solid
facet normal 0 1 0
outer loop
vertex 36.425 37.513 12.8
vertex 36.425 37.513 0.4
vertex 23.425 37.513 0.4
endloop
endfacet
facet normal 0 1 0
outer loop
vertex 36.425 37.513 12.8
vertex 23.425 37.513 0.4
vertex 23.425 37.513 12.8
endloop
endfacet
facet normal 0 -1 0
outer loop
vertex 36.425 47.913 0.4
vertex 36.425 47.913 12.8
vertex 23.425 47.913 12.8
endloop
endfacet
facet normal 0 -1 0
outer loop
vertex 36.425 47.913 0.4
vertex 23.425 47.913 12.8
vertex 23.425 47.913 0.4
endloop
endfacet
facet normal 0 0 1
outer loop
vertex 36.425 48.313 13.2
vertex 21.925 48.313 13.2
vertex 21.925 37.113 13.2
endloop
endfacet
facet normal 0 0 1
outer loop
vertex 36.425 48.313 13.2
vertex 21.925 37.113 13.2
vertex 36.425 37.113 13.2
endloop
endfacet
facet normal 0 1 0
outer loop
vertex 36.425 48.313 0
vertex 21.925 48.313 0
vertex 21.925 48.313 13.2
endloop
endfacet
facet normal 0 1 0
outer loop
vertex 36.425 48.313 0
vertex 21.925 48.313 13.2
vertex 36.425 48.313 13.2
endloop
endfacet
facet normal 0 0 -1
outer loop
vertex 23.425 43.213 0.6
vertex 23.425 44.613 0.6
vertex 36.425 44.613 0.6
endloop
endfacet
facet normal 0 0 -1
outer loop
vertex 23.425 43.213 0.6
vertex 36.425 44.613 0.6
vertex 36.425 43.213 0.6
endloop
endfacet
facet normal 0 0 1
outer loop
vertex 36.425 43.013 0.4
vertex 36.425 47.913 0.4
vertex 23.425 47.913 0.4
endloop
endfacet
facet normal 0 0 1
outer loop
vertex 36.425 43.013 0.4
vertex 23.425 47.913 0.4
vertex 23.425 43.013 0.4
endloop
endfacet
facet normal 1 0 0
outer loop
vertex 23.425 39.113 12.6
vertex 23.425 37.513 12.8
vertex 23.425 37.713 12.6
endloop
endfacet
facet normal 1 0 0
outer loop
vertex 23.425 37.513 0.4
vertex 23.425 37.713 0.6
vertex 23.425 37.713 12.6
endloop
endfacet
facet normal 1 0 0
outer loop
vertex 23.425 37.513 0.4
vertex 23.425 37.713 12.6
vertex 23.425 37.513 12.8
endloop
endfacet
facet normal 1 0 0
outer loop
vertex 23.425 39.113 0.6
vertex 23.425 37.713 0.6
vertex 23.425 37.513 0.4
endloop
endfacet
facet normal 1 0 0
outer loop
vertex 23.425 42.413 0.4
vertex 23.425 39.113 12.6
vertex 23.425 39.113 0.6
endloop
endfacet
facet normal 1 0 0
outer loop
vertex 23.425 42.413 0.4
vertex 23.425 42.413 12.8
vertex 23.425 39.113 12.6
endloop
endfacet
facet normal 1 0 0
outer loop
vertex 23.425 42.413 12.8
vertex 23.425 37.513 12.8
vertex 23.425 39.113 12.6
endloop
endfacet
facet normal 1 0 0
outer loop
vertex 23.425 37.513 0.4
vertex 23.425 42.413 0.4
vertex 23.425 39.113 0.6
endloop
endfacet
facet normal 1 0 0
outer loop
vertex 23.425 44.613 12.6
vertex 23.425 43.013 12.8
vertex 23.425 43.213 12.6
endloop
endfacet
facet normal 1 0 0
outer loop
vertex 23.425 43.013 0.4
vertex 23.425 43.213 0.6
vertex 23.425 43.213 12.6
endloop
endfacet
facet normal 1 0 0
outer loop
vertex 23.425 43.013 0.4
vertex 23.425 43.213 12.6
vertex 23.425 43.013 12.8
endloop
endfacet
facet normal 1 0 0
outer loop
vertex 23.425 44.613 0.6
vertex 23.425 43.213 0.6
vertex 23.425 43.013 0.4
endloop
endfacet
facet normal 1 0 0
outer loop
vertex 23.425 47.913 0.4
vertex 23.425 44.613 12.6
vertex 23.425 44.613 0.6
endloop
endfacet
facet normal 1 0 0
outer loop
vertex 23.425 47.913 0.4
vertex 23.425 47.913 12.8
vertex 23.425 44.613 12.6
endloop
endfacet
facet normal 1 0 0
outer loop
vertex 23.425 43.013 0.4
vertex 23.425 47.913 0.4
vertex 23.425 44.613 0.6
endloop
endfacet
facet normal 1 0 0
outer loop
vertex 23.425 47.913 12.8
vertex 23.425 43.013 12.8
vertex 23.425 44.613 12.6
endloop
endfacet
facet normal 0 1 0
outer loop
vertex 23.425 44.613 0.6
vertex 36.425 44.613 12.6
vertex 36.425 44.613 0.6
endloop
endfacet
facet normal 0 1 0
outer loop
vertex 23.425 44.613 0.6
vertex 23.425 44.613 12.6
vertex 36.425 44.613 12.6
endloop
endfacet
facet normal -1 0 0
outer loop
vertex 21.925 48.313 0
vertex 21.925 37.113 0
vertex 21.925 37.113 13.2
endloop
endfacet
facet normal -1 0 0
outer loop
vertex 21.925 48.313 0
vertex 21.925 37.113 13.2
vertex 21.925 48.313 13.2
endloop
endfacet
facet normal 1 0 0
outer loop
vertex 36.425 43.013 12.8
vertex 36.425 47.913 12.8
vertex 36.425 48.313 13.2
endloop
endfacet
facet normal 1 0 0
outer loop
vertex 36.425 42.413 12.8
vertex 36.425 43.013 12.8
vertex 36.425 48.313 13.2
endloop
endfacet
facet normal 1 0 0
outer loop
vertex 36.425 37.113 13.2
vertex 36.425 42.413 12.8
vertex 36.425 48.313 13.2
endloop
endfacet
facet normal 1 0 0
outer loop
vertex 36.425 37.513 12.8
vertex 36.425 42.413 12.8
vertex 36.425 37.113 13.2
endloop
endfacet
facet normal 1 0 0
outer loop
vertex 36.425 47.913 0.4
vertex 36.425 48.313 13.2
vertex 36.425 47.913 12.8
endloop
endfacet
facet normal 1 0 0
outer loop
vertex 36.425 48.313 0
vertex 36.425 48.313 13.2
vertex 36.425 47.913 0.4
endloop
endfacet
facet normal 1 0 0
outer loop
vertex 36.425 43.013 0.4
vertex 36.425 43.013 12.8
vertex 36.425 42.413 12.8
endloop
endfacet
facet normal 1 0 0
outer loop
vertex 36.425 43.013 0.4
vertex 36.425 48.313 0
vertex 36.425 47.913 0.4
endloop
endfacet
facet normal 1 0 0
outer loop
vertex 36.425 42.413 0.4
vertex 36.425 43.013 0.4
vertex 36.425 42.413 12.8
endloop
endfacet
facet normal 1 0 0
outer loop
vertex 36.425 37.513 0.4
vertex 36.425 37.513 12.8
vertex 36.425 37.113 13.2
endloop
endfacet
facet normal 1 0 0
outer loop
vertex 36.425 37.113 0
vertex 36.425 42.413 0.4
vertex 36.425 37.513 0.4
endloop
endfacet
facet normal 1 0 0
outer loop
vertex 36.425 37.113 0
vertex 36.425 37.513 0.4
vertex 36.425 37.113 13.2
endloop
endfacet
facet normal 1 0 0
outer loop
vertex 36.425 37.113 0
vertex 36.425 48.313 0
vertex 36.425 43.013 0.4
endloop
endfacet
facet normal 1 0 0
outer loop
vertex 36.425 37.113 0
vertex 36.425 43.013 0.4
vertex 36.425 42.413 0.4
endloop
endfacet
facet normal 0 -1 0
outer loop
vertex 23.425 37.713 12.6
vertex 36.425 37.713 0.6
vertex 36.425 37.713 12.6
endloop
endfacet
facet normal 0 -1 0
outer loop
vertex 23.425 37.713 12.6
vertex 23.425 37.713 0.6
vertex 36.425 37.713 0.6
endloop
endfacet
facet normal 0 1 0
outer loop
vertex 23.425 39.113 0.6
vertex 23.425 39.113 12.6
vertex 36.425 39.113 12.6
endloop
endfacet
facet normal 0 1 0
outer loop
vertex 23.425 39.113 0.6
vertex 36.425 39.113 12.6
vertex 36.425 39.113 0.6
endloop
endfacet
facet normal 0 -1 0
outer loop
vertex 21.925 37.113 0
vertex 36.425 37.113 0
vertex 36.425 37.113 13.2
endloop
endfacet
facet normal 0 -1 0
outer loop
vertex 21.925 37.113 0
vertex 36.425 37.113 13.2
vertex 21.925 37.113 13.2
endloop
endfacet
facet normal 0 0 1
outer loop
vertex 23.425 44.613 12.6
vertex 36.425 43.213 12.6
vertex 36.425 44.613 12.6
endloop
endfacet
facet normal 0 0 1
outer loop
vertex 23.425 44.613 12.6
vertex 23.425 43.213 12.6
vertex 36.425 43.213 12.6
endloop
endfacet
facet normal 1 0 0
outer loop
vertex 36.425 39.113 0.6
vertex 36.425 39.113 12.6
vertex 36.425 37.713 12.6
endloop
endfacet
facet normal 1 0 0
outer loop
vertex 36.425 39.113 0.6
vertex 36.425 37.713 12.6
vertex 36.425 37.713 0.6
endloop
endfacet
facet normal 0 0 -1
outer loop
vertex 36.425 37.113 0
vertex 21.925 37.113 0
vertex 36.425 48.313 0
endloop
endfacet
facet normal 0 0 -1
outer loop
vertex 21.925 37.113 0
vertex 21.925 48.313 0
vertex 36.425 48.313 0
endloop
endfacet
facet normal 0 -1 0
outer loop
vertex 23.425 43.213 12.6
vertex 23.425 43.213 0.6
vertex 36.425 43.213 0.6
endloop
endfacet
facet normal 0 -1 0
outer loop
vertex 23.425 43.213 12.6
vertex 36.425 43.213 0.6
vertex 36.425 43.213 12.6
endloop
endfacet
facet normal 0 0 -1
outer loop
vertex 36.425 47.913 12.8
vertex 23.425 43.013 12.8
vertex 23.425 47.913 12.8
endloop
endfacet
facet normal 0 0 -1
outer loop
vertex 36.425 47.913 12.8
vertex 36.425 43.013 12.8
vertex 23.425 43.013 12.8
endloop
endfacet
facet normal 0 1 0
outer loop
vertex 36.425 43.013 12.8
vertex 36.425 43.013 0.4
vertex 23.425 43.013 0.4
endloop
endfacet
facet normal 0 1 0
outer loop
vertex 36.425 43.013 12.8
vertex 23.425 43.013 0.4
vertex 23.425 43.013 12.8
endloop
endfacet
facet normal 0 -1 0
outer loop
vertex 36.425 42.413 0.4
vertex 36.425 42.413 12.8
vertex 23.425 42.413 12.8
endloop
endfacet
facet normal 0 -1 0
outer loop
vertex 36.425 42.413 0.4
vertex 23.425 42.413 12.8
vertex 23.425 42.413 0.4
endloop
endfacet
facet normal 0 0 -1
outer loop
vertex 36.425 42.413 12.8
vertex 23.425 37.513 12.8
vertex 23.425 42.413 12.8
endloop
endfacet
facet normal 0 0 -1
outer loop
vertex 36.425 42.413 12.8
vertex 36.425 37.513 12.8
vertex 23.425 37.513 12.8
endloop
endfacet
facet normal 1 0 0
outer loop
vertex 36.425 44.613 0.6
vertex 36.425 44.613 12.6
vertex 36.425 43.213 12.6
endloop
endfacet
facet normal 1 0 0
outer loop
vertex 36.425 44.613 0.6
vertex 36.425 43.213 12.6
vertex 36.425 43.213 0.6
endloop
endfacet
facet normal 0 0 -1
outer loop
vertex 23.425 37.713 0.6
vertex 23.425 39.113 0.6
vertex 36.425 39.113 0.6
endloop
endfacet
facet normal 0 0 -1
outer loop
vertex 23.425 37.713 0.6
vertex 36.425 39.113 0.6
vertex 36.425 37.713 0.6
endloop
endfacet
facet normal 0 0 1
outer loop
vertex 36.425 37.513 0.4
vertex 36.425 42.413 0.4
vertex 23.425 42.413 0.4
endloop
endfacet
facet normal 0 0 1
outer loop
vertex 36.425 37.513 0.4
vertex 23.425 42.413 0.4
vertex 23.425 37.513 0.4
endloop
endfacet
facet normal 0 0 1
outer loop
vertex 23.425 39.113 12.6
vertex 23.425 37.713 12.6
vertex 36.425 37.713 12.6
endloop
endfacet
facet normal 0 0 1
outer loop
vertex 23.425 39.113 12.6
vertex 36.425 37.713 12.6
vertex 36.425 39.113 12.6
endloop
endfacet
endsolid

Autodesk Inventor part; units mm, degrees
ref_plane "YZ Plane" through (0, 0, 0) normal (1, 0, 0) x (0, 1, 0)
ref_plane "XZ Plane" through (0, 0, 0) normal (0, 1, 0) x (-1, 0, 0)
ref_plane "Work Plane1" through (0, 0.2202, 0) normal (0, 0, 1) x (1, 0, 0)
sketch "Sketch1" plane through (0, 0.2202, 0) normal (0, 0, 1) x (1, 0, 0)
  line L0 (21.9247, 42.5927) -> (36.4247, 42.5927)
  line L1 (36.4247, 42.5927) -> (36.4247, 36.8927)
  line L2 (36.4247, 36.8927) -> (21.9247, 36.8927)
  line L3 (21.9247, 36.8927) -> (21.9247, 42.5927)
  point P0 (0, -0.2202)
  dimension "d0" = 14.5
  dimension "d2" = 5.7
extrude "Extrusion1" add sketch "Sketch1" along normal blind 13.2
sketch "Sketch2" plane through (36.4247, 37.1129, 0) normal (1, 0, 0) x (0, 0, -1)
  line L0 (0, 5.7) -> (0, 0) projected
  line L1 (0, 5.7) -> (-13.2, 5.7) projected
  line L2 (-13.2, 0) -> (-13.2, 5.7) projected
  line L3 (0, 0) -> (-13.2, 0) projected
  line L4 (-12.8, 5.3) -> (-0.4, 5.3)
  line L5 (-0.4, 5.3) -> (-0.4, 0.4)
  line L6 (-0.4, 0.4) -> (-12.8, 0.4)
  line L7 (-12.8, 0.4) -> (-12.8, 5.3)
  point P0 (0, -37.1129)
  dimension "d5" = 0.4
extrude "Extrusion2" cut sketch "Sketch2" against normal blind 13 contours L4 L5 L6 L7
sketch "Sketch3" plane through (23.4247, 37.1129, 0) normal (1, 0, 0) x (0, 0, -1)
  line L0 (-12.8, 0.4) -> (-12.8, 5.3) projected
  line L1 (-0.4, 0.4) -> (-12.8, 0.4) projected
  line L2 (-0.4, 5.3) -> (-0.4, 0.4) projected
  line L3 (-12.6, 2) -> (-0.6, 2)
  line L4 (-0.6, 2) -> (-0.6, 0.6)
  line L5 (-0.6, 0.6) -> (-12.6, 0.6)
  line L6 (-12.6, 0.6) -> (-12.6, 2)
  point P0 (0, -37.1129)
  dimension "d8" = 0.2
  dimension "d9" = 0.2
  dimension "d10" = 0.2
  dimension "d11" = 1.4
extrude "Extrusion3" add sketch "Sketch3" along normal blind 13
pattern_linear "Rectangular Pattern1" count 2 spacing 5.5 along (0, 1, 0) of "Extrusion1", "Extrusion3", "Extrusion2"
properties part number "nanopc_t4_usb"
